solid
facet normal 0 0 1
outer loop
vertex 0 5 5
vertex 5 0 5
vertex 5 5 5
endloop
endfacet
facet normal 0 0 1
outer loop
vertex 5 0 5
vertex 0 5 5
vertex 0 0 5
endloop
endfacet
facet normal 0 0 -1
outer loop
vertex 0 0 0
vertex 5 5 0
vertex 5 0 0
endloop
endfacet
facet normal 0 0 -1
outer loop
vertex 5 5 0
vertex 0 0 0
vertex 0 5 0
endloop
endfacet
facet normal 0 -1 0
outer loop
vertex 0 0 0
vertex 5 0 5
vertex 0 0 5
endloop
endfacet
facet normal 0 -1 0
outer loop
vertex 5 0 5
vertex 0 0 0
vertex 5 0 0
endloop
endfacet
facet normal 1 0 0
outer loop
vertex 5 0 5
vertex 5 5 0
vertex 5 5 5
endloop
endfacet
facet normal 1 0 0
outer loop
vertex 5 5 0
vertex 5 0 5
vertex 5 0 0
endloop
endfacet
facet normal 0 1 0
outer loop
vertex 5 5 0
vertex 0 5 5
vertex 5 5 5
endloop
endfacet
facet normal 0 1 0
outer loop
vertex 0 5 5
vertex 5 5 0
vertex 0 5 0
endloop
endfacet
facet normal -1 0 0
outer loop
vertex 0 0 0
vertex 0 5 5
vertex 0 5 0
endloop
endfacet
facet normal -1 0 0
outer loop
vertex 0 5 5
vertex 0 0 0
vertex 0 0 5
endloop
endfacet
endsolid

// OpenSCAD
$fn = 30;

//Remove Cube
//difference(){
	//cube([6,6,6], center = true);
	//cylinder(h = 3, r = 3.5);
	
//}

//Join Cylinder
//union(){
	//cube([6,6,6], center = true);
	//cylinder(h = 3, r = 3.5);
	
//}

//overlapping
//intersection(){
	//cube([6,6,6], center = true);
	//cylinder(h = 3, r = 3.5);
//}

//Move object via x,y and z axesies
//translate([1, 1, 5]){
	//cube([5,5,1]);
//}

scale([1, 1, 5]){
	cube([5,5,1]);
}
